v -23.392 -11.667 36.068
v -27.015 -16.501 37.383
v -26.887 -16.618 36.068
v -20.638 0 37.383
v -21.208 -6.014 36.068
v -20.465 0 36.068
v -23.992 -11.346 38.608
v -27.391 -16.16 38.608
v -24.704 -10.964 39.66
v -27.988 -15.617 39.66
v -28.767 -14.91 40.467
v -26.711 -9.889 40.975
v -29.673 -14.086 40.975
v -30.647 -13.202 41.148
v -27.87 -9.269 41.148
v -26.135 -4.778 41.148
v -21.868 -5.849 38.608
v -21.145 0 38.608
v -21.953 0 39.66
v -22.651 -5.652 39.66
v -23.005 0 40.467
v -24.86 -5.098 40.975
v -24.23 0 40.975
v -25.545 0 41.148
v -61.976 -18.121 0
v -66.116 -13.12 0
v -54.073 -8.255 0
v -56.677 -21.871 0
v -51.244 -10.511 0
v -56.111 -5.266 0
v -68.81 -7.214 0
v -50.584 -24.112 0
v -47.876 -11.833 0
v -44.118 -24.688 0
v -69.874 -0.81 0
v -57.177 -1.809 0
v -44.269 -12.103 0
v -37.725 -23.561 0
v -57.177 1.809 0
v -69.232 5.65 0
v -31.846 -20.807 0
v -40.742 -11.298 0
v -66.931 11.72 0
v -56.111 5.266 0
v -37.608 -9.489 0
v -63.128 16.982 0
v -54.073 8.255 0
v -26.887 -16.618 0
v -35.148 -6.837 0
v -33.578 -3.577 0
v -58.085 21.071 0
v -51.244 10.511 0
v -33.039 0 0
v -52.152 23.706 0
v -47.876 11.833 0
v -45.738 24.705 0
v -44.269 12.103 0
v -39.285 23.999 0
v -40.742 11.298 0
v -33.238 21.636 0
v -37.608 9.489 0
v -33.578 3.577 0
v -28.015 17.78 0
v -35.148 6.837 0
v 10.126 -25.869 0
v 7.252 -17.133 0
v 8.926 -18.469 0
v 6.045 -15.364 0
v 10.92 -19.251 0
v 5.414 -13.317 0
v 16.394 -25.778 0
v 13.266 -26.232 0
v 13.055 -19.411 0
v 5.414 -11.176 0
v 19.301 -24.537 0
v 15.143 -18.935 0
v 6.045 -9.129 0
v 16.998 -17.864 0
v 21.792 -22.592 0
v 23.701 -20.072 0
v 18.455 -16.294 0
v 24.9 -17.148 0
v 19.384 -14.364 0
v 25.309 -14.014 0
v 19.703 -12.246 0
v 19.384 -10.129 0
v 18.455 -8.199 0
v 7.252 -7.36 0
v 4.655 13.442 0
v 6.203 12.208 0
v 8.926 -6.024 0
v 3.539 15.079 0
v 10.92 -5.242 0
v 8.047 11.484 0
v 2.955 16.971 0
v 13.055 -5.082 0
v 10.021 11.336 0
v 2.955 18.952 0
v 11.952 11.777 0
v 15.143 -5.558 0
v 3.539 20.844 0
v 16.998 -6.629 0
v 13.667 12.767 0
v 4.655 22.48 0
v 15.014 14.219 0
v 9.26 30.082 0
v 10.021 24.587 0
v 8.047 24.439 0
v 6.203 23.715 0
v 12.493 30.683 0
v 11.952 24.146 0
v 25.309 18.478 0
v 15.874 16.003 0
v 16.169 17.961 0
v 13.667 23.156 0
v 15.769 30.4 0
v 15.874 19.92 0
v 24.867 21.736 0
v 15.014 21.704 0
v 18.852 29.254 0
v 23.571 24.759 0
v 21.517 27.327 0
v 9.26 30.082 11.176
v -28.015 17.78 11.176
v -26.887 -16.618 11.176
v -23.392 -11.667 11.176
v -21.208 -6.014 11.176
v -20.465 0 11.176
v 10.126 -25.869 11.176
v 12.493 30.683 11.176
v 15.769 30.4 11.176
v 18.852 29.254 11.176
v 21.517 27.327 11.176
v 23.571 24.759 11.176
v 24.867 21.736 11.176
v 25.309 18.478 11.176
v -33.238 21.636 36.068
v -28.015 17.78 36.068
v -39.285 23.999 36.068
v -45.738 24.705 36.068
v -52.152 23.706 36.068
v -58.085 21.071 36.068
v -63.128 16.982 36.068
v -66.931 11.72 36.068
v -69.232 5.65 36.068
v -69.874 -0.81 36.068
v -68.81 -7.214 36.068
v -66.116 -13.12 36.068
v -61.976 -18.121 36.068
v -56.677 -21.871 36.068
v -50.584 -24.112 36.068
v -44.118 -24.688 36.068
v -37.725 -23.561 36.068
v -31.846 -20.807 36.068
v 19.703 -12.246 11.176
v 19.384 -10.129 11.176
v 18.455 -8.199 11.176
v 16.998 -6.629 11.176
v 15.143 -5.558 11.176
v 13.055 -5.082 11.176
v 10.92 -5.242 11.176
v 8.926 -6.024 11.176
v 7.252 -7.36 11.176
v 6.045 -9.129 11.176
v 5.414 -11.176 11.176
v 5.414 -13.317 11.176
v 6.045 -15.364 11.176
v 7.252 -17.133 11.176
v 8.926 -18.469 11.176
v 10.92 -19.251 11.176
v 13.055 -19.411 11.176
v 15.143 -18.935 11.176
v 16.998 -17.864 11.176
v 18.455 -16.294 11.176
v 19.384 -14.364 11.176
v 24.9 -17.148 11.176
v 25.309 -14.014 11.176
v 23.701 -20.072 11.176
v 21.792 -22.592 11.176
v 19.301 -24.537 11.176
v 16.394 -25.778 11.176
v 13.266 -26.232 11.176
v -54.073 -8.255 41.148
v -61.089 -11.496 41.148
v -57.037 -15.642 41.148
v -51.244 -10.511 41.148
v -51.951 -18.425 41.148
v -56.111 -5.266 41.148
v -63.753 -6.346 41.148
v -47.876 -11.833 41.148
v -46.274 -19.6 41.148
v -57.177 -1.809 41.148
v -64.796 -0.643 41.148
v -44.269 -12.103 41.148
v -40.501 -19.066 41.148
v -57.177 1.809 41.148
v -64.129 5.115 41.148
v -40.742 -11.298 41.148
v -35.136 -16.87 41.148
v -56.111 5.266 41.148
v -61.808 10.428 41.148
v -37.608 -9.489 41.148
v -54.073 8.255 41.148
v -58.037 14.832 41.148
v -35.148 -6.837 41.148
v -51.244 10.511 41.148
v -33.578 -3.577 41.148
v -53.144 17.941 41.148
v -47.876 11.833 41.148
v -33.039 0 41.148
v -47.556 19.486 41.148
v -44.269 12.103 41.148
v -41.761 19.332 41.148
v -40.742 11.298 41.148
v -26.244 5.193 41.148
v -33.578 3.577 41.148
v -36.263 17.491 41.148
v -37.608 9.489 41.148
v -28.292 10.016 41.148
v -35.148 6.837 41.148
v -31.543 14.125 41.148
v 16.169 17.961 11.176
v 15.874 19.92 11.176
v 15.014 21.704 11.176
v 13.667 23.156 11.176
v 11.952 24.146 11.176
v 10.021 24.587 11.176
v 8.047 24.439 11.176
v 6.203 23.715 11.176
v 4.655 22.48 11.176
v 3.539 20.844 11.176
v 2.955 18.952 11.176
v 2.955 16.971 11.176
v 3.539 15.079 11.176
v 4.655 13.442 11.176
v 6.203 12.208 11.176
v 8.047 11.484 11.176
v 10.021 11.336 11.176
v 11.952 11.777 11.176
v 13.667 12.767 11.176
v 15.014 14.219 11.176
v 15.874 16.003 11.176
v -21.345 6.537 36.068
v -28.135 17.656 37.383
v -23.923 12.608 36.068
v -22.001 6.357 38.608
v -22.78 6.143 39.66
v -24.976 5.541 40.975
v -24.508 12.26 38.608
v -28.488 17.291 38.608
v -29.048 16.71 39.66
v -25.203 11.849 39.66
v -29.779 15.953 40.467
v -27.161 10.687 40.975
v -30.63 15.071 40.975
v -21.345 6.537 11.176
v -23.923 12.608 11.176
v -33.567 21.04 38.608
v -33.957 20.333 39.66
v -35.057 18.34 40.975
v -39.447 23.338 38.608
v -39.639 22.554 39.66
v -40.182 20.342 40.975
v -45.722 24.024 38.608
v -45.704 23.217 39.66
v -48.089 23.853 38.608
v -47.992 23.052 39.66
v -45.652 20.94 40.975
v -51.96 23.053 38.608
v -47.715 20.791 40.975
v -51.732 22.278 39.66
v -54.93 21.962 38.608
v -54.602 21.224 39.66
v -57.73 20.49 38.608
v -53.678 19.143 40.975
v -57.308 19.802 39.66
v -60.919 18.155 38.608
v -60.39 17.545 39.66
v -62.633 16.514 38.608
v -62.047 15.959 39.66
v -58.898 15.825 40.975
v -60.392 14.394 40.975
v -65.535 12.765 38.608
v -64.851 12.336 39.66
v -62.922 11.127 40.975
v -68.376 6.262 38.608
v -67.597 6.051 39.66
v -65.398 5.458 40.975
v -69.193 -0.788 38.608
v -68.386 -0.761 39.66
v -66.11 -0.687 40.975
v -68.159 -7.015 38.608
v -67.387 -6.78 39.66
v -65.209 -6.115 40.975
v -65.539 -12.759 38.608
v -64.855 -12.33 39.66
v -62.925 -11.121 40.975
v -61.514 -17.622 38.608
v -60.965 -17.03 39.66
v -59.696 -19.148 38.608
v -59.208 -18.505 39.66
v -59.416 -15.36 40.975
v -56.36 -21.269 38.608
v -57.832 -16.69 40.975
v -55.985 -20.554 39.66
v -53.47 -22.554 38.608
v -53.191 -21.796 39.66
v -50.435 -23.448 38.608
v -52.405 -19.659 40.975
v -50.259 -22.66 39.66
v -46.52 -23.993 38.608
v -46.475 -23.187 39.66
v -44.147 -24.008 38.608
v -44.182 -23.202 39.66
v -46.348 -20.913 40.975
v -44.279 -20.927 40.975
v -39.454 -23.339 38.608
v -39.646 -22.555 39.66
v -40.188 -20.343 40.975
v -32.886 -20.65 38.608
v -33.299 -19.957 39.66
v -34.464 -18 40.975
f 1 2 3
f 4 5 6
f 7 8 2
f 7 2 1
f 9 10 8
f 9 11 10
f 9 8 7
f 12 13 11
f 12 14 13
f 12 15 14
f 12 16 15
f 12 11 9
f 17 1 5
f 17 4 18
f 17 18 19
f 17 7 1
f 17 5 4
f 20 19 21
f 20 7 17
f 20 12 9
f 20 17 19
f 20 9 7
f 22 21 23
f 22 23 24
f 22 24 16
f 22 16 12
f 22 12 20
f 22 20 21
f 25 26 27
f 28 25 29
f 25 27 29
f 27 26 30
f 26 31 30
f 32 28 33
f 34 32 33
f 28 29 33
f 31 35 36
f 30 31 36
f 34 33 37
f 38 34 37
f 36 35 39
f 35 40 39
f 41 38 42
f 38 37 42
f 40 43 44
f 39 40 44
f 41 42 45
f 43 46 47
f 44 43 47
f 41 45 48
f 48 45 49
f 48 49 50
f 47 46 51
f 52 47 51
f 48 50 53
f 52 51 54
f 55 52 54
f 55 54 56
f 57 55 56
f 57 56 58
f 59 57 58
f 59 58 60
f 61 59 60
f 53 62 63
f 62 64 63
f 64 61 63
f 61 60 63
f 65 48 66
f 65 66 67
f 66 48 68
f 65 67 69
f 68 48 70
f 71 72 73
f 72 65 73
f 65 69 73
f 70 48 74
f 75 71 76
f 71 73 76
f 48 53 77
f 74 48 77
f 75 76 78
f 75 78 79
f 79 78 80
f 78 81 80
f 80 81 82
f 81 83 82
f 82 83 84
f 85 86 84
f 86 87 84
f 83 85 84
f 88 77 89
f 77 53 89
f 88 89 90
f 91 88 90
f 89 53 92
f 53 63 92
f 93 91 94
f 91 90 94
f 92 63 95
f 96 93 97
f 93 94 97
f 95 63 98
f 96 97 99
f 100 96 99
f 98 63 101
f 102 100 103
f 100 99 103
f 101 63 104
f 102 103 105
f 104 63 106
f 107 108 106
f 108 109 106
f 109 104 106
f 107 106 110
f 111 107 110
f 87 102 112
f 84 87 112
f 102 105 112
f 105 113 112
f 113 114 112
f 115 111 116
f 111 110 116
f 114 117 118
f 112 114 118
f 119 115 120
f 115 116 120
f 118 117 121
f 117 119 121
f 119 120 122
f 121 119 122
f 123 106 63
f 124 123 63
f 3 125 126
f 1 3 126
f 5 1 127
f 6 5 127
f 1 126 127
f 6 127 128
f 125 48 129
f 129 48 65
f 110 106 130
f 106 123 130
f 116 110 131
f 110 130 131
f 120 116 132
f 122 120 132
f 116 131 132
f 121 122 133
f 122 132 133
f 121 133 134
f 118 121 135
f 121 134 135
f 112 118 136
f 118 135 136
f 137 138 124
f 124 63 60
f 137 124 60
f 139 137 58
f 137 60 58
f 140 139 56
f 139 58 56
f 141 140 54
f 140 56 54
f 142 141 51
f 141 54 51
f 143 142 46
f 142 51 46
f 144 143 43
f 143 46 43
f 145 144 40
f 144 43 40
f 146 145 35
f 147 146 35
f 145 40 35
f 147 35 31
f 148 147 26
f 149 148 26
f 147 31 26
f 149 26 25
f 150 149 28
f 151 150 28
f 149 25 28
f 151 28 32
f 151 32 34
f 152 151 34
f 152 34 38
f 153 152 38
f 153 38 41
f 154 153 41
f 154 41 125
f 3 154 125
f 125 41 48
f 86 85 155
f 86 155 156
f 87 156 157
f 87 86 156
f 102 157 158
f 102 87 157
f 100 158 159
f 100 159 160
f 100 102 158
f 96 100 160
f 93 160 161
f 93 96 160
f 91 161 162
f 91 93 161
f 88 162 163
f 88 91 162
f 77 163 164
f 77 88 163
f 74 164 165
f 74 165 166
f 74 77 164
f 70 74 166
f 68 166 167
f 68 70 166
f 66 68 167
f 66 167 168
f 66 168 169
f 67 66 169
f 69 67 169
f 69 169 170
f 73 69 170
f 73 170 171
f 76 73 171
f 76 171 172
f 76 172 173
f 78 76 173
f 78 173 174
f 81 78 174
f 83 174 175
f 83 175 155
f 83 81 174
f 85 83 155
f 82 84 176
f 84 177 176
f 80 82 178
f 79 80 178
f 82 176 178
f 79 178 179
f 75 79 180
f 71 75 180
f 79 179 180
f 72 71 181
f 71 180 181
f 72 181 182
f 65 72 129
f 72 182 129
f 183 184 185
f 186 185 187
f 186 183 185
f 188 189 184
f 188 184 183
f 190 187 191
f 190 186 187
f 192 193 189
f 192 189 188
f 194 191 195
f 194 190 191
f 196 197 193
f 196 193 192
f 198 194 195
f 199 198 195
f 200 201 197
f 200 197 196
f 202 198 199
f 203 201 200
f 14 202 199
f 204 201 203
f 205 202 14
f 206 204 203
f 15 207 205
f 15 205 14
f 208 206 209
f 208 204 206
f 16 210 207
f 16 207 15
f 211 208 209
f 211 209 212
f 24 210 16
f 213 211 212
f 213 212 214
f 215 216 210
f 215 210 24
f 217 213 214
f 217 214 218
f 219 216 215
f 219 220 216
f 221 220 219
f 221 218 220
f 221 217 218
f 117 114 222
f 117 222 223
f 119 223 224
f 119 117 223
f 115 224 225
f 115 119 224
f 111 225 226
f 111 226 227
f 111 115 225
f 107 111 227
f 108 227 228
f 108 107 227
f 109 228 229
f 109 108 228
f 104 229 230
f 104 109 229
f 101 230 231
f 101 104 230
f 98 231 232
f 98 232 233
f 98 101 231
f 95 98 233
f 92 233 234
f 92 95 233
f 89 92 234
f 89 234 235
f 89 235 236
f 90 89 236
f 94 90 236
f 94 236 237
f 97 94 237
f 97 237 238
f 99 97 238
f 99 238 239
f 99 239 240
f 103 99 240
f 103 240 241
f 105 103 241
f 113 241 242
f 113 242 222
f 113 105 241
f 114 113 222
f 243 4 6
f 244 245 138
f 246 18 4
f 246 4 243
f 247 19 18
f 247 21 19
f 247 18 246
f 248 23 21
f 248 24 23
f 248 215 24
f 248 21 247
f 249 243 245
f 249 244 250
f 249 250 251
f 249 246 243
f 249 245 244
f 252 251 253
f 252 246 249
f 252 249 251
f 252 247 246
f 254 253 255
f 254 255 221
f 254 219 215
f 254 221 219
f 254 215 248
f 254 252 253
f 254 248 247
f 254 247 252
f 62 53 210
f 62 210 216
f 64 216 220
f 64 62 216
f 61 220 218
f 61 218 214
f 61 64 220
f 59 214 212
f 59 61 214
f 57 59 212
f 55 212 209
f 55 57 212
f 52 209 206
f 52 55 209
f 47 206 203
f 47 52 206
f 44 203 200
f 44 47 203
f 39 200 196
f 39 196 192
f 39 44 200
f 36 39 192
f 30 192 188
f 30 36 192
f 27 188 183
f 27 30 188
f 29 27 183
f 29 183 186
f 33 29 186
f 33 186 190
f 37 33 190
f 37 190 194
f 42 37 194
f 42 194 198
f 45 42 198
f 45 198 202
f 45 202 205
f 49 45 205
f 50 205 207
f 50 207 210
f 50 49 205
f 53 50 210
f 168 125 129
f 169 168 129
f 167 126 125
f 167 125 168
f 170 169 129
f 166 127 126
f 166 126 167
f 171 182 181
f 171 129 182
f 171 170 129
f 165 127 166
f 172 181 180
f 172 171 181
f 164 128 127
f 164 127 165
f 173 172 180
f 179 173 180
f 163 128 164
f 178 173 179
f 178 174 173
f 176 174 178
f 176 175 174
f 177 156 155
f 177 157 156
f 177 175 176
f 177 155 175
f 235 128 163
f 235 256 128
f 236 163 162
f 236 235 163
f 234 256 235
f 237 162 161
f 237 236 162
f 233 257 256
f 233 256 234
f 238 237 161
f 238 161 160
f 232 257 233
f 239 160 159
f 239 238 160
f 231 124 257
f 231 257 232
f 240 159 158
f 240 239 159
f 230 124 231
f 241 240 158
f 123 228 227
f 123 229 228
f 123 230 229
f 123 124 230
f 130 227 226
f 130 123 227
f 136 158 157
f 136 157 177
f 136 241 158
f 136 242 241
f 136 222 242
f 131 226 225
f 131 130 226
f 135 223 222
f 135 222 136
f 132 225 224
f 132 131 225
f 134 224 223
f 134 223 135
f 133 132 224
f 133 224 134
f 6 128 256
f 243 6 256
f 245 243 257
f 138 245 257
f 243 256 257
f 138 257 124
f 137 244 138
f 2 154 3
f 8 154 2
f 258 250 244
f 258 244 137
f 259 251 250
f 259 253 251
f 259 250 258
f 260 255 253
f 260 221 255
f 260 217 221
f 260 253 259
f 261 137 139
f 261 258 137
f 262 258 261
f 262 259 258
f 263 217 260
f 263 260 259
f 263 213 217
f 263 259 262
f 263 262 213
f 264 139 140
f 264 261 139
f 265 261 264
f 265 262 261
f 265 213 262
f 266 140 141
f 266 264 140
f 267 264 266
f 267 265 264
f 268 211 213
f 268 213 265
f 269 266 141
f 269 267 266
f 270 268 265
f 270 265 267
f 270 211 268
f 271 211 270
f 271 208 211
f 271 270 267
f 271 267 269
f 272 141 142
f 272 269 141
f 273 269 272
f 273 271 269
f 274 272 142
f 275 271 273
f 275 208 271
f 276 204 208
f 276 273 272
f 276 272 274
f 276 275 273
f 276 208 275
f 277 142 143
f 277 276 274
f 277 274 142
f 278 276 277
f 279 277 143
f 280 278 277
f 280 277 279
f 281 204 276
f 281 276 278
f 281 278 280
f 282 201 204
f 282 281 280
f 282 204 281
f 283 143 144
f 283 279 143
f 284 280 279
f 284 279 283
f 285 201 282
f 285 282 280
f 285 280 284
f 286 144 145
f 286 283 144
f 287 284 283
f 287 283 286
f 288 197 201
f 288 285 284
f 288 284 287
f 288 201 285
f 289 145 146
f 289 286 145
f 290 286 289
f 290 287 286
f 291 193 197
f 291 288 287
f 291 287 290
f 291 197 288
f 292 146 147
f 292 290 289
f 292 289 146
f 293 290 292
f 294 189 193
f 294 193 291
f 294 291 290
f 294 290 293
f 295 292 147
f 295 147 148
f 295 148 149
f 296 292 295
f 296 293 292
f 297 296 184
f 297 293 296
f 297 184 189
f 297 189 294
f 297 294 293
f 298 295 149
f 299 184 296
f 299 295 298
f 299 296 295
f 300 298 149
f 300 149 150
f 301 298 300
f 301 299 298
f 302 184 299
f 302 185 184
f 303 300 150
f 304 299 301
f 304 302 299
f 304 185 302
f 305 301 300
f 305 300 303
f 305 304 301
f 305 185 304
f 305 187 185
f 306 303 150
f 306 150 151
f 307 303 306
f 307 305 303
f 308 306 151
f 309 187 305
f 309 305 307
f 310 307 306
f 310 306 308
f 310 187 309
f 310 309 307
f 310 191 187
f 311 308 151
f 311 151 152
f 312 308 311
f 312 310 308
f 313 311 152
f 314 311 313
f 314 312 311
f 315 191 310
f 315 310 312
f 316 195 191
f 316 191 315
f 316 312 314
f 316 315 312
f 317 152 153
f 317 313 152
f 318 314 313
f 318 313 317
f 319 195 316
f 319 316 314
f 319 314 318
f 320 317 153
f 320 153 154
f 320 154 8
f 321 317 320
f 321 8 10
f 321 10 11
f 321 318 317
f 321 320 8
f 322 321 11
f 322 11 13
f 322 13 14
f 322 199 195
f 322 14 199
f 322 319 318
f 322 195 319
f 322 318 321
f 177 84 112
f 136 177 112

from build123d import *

# Parameters (mm, degrees)
F0_R     = 12.137084
F1_DEPTH = 41.148
F2_R     = 5.08
F0_R_2   = 7.184779
F0_R_3   = 6.643855
F3_DEPTH = 11.176
F4_R     = 12.219886


with BuildPart() as f1:
    # F0 (on Top) → F1 (new body)
    with BuildSketch(Plane.XY):
        with BuildLine():
            ThreePointArc((-26.886796, -16.617896), (-22.126002, -8.907848), (-20.464604, 0))
            ThreePointArc((-20.464604, 0), (-22.430371, 9.658588), (-28.014918, 17.780496))
            ThreePointArc((-28.014918, 17.780496), (-69.87355, -0.809985), (-26.886796, -16.617896))
        make_face()
        with Locations((-45.175716, 0)):
            Circle(F0_R, mode=Mode.SUBTRACT)
    extrude(amount=F1_DEPTH)

    # F2
    f2_edges = [f1.edges().sort_by_distance(p)[0] for p in [
        (-63.464637, 16.617896, 41.148),
    ]]
    fillet(f2_edges, radius=F2_R)

    # F0 (on Top) → F3 (join)
    with BuildSketch(Plane.XY):
        with BuildLine():
            ThreePointArc((-28.014918, 17.780496), (-22.430371, 9.658588), (-20.464604, 0))
            ThreePointArc((-20.464604, 0), (-22.126002, -8.907848), (-26.886796, -16.617896))
            Line((-26.886796, -16.617896), (25.309285, -29.663572))
            Line((25.309285, -29.663572), (25.309285, 35.378572))
            Line((25.309285, 35.378572), (-28.014918, 17.780496))
        make_face()
        with Locations((12.518571, -12.246429)):
            Circle(F0_R_2, mode=Mode.SUBTRACT)
        with Locations((9.525, 17.961429)):
            Circle(F0_R_3, mode=Mode.SUBTRACT)
    extrude(amount=F3_DEPTH)

    # F4
    f4_edges = [f1.edges().sort_by_distance(p)[0] for p in [
        (25.309285, -29.663572, 5.588),
        (25.309285, 35.378572, 5.588),
    ]]
    fillet(f4_edges, radius=F4_R)


solid = f1.part
